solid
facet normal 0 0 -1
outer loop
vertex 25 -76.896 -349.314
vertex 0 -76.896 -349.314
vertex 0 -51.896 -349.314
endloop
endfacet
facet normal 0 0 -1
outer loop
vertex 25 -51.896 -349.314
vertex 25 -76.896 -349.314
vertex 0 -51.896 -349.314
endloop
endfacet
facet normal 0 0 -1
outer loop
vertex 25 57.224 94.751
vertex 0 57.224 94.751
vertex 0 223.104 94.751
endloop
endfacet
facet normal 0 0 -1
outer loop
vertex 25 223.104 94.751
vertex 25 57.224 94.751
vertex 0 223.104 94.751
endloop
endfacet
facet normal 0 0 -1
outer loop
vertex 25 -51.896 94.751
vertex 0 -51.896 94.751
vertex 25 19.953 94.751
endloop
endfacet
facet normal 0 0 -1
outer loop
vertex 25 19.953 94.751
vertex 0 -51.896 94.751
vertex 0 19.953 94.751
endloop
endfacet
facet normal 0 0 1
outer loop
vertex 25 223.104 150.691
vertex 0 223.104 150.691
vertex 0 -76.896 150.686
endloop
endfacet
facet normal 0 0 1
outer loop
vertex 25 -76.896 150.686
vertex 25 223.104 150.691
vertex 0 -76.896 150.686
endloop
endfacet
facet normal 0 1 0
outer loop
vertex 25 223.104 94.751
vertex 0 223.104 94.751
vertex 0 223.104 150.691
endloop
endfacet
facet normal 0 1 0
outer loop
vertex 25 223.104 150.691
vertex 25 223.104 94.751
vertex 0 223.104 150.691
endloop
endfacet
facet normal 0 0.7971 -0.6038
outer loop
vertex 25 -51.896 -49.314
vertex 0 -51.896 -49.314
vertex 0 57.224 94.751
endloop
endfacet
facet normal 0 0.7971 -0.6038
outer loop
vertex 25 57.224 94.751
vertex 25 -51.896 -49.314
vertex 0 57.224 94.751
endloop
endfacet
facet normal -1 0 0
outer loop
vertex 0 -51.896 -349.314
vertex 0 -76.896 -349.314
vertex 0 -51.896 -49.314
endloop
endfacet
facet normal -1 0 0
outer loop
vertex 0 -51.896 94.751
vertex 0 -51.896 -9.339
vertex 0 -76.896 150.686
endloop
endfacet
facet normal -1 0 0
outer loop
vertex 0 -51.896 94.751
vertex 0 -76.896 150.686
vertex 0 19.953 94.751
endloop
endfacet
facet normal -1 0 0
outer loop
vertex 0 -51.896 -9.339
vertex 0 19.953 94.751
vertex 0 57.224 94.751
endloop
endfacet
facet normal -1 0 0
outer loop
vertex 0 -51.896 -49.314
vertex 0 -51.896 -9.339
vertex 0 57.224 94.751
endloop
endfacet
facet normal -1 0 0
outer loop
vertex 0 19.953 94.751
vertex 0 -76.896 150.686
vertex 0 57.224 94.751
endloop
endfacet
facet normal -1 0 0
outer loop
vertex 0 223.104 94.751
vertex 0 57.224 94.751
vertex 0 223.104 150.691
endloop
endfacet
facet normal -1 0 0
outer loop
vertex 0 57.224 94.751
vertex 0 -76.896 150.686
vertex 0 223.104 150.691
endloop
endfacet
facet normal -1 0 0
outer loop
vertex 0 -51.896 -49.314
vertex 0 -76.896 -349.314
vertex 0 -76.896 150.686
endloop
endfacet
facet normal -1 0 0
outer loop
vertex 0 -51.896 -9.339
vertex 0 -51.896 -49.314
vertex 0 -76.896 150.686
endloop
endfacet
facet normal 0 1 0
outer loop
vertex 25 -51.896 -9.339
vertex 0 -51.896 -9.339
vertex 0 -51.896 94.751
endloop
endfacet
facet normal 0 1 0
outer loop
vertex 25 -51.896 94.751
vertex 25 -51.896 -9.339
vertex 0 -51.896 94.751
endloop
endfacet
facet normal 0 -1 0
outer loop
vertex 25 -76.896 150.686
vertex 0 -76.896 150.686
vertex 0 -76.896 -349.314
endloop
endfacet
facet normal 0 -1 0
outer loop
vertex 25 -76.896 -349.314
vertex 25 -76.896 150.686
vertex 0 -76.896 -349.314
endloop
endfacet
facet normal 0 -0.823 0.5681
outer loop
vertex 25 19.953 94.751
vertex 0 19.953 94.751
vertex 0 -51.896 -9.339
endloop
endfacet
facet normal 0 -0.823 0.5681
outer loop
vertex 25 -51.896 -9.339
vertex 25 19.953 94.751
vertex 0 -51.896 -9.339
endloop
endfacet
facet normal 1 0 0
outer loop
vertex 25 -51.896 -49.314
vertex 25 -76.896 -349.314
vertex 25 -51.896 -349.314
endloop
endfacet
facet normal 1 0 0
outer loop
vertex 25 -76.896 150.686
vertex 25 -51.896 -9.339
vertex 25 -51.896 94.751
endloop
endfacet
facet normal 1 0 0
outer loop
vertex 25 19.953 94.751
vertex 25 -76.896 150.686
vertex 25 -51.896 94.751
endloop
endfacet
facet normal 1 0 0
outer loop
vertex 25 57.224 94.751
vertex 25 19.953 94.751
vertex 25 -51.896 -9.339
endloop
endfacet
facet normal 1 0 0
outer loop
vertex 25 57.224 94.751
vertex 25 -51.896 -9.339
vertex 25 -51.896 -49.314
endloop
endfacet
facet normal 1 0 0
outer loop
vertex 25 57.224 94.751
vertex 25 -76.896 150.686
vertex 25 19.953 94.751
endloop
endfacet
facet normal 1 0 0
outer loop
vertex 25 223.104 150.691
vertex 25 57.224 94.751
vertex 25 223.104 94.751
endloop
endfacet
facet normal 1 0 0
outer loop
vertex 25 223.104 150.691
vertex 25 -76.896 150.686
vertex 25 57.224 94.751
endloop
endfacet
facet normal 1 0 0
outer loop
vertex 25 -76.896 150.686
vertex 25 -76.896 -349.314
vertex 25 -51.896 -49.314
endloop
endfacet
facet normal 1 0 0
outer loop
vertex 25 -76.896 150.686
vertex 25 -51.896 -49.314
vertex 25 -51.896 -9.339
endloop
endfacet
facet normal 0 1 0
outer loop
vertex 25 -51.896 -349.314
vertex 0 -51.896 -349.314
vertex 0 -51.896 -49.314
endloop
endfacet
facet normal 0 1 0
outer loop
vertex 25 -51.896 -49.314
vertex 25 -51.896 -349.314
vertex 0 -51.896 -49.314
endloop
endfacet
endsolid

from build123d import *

# Parameters (mm, degrees)
F1_DEPTH = 25


with BuildPart() as f1:
    # F0 (on Right) → F1 (new body)
    with BuildSketch(Plane.YZ):
        Polygon((-76.896277, 150.686045), (-76.896277, -349.313955), (-51.896277, -349.313955), (-51.896277, -49.313955), (-51.896277, -9.338717), (-51.896277, 94.751239), (19.953003, 94.751239), (57.223622, 94.751239), (223.103723, 94.751239), (223.103723, 150.690981), align=None)
        Polygon((-51.896277, -9.338717), (-51.896277, -49.313955), (57.223622, 94.751239), (19.953003, 94.751239), align=None)
    extrude(amount=F1_DEPTH)


solid = f1.part
